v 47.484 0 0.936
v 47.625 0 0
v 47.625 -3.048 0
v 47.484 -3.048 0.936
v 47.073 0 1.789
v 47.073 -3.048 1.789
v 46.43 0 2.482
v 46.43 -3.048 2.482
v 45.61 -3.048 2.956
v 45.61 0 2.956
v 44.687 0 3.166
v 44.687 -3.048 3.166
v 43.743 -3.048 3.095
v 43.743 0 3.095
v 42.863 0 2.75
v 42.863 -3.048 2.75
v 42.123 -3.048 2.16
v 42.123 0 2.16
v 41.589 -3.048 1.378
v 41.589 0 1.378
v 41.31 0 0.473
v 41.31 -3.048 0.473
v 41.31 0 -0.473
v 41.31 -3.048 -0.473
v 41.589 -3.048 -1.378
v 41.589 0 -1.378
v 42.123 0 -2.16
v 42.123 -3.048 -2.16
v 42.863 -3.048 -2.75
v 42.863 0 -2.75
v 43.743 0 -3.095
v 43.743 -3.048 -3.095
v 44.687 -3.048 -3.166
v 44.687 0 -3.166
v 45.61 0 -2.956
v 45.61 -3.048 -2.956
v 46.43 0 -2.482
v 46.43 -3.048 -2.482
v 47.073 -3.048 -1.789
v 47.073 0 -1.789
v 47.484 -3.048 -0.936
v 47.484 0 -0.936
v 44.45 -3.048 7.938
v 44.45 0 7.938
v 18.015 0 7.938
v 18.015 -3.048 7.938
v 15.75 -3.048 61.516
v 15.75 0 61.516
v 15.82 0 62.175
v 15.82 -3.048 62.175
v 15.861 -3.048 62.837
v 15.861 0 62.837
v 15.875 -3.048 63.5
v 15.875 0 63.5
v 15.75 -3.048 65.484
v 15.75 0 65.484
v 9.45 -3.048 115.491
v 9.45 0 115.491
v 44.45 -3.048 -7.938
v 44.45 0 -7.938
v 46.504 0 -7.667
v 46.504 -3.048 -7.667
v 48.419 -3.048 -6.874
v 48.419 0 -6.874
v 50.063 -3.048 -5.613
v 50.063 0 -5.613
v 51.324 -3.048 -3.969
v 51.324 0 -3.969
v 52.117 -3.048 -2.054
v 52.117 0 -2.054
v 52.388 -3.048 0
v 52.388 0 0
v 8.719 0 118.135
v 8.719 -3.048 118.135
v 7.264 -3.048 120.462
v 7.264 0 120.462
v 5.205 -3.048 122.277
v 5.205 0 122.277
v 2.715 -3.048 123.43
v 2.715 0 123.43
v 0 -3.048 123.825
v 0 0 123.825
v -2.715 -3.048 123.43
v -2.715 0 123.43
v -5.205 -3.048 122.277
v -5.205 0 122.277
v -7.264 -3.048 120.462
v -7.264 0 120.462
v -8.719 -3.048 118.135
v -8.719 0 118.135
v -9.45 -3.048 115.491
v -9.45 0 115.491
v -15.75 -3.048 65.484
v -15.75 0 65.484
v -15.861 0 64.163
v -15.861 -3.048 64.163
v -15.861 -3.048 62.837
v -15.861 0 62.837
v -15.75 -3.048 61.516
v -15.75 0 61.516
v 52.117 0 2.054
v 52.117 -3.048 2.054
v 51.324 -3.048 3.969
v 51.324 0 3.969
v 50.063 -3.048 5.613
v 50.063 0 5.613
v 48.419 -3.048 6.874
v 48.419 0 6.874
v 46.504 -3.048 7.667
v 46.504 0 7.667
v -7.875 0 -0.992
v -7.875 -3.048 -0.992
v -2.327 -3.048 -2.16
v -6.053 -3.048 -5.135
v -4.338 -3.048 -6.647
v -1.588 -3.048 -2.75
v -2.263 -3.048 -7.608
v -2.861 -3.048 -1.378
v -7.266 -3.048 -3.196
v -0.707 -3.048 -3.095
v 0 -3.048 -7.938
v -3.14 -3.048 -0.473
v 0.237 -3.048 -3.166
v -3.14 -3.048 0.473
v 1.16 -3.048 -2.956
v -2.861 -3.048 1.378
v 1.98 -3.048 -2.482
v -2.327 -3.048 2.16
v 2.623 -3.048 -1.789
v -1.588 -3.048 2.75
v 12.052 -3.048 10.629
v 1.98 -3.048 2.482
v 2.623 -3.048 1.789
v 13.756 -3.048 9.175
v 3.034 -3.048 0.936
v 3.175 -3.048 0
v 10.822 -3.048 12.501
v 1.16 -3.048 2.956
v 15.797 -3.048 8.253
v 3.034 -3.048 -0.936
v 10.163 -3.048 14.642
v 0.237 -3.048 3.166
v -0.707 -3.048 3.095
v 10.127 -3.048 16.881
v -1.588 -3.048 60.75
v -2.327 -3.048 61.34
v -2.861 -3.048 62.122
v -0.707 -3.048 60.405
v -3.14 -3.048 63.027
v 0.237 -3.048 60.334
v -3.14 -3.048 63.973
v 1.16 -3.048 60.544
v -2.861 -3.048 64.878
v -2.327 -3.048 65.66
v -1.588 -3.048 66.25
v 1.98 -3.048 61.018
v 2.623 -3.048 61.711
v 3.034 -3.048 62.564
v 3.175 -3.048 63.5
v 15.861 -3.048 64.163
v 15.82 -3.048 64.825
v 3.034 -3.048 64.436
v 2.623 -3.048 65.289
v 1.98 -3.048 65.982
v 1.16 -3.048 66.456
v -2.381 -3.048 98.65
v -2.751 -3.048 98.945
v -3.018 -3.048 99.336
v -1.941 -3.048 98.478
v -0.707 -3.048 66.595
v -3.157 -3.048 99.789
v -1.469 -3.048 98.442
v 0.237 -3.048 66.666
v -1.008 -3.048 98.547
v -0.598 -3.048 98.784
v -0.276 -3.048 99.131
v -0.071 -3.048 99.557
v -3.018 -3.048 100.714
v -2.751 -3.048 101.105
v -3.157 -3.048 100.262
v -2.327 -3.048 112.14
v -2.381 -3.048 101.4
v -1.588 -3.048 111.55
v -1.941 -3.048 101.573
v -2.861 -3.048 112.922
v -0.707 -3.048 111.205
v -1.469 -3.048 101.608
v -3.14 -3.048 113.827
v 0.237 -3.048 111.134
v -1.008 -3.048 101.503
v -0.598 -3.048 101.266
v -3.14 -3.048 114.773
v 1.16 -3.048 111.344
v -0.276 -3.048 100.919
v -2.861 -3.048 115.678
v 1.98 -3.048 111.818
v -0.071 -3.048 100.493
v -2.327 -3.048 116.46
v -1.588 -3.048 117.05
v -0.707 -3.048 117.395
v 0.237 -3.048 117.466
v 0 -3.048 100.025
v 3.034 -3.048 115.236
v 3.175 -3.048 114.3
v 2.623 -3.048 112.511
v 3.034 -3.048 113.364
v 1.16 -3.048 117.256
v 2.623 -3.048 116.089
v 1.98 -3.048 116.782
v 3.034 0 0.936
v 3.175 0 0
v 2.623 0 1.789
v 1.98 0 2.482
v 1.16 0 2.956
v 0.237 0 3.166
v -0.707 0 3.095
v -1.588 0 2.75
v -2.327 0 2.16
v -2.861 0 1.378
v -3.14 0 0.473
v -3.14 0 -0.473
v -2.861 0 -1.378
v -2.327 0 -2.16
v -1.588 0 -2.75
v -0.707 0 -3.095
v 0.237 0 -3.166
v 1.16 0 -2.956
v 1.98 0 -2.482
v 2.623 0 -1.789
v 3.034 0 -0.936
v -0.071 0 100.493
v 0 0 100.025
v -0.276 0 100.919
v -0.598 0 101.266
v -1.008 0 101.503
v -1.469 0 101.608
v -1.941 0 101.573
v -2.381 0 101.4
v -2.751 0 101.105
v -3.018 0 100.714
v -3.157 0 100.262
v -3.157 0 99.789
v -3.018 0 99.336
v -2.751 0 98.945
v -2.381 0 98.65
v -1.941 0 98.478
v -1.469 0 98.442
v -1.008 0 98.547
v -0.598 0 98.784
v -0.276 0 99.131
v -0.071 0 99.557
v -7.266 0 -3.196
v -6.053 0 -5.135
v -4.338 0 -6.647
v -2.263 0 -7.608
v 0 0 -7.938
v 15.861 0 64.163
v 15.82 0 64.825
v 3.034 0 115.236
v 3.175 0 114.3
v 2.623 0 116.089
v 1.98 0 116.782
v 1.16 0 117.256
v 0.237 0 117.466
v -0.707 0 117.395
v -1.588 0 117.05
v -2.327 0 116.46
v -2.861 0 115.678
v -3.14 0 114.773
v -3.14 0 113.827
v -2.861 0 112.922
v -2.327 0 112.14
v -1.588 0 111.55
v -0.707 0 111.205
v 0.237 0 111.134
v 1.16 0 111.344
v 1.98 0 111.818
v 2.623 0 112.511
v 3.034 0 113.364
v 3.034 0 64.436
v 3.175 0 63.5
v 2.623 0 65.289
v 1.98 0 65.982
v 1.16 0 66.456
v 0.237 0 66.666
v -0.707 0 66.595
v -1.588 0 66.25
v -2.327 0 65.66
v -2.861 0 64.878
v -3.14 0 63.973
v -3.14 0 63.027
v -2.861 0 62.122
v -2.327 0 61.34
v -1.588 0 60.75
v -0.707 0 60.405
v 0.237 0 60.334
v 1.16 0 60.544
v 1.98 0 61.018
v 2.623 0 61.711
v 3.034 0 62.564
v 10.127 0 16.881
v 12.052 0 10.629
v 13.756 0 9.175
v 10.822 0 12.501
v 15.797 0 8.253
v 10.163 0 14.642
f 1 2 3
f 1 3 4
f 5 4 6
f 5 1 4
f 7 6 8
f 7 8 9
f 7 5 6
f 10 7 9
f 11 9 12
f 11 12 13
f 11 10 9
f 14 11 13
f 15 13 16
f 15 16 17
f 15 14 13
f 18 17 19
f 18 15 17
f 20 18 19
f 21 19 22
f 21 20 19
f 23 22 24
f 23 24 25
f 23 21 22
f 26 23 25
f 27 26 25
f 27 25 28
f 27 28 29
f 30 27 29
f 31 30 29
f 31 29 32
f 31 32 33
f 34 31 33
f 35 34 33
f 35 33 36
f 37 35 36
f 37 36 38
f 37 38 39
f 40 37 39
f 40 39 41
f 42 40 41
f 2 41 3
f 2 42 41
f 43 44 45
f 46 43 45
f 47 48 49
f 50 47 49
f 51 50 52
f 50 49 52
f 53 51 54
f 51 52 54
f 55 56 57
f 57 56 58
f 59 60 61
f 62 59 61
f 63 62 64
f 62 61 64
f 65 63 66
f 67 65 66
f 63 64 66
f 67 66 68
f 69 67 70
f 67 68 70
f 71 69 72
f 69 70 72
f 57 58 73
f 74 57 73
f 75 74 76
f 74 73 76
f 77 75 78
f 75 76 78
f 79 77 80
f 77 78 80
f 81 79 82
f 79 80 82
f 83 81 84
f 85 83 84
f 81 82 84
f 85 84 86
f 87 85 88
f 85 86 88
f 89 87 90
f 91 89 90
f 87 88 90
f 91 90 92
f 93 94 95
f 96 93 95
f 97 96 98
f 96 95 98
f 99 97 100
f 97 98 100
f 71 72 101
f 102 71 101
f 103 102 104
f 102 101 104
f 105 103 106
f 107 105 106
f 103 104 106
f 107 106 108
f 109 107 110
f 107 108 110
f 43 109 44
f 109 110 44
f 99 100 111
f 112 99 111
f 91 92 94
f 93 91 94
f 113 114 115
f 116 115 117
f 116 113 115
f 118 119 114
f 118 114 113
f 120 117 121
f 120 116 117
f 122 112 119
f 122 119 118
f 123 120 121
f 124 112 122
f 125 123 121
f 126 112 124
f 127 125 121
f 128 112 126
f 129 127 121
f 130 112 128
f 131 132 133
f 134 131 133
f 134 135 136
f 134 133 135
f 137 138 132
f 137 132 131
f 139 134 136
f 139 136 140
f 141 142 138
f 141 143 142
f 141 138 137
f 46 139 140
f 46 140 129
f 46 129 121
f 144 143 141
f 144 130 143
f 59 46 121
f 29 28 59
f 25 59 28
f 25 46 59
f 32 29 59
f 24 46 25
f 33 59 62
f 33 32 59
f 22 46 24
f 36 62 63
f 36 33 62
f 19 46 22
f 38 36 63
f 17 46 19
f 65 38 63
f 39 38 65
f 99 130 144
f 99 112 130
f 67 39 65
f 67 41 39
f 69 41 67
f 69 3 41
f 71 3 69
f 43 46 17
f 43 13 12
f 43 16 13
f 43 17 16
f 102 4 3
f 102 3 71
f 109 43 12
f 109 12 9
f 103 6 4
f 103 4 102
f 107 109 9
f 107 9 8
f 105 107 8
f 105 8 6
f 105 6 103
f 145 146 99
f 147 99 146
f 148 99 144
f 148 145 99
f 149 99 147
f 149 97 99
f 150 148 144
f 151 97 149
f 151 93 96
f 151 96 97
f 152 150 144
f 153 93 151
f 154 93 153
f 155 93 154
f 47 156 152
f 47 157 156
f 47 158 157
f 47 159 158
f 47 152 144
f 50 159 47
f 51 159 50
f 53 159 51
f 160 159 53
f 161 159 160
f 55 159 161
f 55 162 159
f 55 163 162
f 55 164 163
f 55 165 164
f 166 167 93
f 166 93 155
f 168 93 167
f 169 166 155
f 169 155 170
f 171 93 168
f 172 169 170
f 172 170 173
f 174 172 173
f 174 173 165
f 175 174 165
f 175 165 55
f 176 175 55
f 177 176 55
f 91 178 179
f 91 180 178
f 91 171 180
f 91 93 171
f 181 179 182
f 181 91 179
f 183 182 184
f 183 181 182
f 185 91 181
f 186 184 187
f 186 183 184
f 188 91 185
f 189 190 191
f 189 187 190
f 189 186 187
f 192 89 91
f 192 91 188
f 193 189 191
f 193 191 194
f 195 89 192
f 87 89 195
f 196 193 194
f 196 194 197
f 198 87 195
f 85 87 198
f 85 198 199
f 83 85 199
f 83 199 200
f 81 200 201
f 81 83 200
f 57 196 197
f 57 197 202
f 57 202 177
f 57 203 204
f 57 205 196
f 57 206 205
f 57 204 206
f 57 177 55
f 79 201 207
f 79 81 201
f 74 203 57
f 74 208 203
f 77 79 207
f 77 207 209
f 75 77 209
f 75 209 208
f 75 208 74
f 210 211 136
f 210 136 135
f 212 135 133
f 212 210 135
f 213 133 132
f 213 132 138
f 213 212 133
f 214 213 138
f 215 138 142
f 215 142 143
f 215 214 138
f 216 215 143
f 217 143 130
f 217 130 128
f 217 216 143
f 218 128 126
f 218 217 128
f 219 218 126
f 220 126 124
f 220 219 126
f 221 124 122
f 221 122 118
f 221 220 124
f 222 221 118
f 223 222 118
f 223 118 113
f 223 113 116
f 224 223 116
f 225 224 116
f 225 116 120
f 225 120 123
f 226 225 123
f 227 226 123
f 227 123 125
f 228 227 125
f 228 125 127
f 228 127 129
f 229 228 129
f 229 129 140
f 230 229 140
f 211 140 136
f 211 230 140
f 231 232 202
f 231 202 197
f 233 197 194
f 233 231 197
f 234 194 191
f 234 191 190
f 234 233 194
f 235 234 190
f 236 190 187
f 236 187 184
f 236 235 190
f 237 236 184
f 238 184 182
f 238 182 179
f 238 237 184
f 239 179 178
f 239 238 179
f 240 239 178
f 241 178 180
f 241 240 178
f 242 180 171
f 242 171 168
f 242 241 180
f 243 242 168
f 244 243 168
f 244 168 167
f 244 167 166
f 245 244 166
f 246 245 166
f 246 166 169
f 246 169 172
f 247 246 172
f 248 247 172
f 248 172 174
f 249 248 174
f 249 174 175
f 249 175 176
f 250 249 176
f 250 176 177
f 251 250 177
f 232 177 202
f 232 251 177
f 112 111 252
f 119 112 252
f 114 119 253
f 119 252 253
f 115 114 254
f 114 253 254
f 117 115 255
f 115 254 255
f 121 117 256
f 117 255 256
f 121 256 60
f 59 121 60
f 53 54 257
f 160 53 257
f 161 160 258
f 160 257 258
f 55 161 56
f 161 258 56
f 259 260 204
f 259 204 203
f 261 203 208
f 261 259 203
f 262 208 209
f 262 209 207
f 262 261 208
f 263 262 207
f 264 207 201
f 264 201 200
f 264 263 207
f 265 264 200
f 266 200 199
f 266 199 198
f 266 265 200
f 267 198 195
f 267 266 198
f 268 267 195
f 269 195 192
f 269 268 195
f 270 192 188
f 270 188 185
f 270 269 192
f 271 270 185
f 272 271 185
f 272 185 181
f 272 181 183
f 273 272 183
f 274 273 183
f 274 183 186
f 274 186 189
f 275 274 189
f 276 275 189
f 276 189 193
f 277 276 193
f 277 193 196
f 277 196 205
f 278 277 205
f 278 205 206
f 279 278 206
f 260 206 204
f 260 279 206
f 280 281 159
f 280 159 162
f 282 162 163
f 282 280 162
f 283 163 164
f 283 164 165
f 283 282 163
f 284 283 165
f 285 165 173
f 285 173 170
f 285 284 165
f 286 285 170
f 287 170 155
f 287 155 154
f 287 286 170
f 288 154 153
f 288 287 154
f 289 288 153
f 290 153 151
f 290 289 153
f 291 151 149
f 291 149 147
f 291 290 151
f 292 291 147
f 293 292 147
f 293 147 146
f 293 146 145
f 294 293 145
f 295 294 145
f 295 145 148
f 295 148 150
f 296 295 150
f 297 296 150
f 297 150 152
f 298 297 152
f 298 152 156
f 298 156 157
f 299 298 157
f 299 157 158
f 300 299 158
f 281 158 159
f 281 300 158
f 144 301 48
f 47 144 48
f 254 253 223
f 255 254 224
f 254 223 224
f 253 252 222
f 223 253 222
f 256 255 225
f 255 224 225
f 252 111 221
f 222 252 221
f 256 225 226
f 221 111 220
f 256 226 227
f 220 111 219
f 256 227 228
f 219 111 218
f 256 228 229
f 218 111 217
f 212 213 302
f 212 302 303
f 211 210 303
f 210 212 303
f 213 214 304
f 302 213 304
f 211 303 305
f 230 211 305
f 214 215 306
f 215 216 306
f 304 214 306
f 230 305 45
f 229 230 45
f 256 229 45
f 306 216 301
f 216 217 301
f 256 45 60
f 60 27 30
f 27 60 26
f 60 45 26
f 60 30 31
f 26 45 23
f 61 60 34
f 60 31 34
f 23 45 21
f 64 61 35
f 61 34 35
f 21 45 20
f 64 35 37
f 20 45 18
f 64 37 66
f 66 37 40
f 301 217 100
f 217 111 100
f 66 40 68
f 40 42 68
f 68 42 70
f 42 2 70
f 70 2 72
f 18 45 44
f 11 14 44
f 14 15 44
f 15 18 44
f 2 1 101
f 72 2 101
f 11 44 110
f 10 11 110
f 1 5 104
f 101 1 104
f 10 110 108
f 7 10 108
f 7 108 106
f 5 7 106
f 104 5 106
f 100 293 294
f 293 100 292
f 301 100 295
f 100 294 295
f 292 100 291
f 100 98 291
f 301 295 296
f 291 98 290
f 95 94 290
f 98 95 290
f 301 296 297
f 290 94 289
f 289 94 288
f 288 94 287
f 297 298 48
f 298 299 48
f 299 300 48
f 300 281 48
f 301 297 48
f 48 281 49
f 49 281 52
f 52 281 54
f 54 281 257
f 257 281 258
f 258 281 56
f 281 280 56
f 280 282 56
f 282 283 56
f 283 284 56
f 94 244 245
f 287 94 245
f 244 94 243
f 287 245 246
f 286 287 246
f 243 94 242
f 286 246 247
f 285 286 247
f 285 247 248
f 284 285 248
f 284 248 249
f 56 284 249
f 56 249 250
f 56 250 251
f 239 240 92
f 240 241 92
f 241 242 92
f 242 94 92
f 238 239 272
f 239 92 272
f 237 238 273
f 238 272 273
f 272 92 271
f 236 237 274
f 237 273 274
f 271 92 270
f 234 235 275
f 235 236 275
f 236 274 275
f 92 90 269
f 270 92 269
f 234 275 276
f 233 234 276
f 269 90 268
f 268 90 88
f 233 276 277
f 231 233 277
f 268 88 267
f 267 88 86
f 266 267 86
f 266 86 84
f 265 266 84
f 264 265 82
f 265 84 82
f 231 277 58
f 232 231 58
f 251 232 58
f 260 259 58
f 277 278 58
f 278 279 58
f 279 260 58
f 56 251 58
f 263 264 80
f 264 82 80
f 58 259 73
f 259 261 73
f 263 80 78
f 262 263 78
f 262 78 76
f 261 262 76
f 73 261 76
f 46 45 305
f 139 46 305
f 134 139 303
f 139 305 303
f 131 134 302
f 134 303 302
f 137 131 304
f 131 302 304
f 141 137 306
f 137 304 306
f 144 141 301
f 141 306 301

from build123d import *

# Parameters (mm, degrees)
F0_R     = 3.175
F0_R_2   = 1.5875
F1_DEPTH = 3.048


with BuildPart() as f1:
    # F0 (on Front) → F1 (new body)
    with BuildSketch(Plane.XZ):
        with BuildLine():
            ThreePointArc((-9.450293, 115.490625), (-0.596483, 104.793695), (9.525, 114.3))
            ThreePointArc((9.525, 114.3), (9.506305, 114.896483), (9.450293, 115.490625))
            ThreePointArc((9.450293, 115.490625), (0, 123.825), (-9.450293, 115.490625))
        make_face()
        with Locations((0, 114.3)):
            Circle(F0_R, mode=Mode.SUBTRACT)
        with BuildLine():
            ThreePointArc((9.450293, 115.490625), (9.506305, 114.896483), (9.525, 114.3))
            ThreePointArc((9.525, 114.3), (-0.596483, 104.793695), (-9.450293, 115.490625))
            Line((-9.450293, 115.490625), (-15.750488, 65.484375))
            ThreePointArc((-15.750488, 65.484375), (0, 79.375), (15.750488, 65.484375))
            Line((15.750488, 65.484375), (9.450293, 115.490625))
        make_face()
        with Locations((-1.5875, 100.0252)):
            Circle(F0_R_2, mode=Mode.SUBTRACT)
        with BuildLine():
            ThreePointArc((15.875, 63.5), (15.843841, 64.494139), (15.750488, 65.484375))
            ThreePointArc((15.750488, 65.484375), (0, 79.375), (-15.750488, 65.484375))
            ThreePointArc((-15.750488, 65.484375), (-15.875, 63.5), (-15.750488, 61.515625))
            ThreePointArc((-15.750488, 61.515625), (0, 47.625), (15.750488, 61.515625))
            ThreePointArc((15.750488, 61.515625), (15.843841, 62.505861), (15.875, 63.5))
        make_face()
        with Locations((0, 63.5)):
            Circle(F0_R, mode=Mode.SUBTRACT)
        with BuildLine():
            ThreePointArc((15.750488, 61.515625), (0, 47.625), (-15.750488, 61.515625))
            Line((-15.750488, 61.515625), (-7.875244, -0.992188))
            ThreePointArc((-7.875244, -0.992188), (-0.497069, 7.921921), (7.9375, 0))
            ThreePointArc((7.9375, 0), (5.61266, -5.61266), (0, -7.9375))
            Line((0, -7.9375), (44.45, -7.9375))
            ThreePointArc((44.45, -7.9375), (36.5125, 0), (44.45, 7.9375))
            Line((44.45, 7.9375), (18.014958, 7.9375))
            ThreePointArc((18.014958, 7.9375), (12.052308, 10.629137), (10.127114, 16.881475))
            Line((10.127114, 16.881475), (15.750488, 61.515625))
        make_face()
        with BuildLine():
            ThreePointArc((7.9375, 0), (-0.497069, 7.921921), (-7.875244, -0.992188))
            ThreePointArc((-7.875244, -0.992188), (-5.250163, -5.953125), (0, -7.9375))
            ThreePointArc((0, -7.9375), (5.61266, -5.61266), (7.9375, 0))
        make_face()
        Circle(F0_R, mode=Mode.SUBTRACT)
        with BuildLine():
            ThreePointArc((44.45, 7.9375), (36.5125, 0), (44.45, -7.9375))
            ThreePointArc((44.45, -7.9375), (50.06266, -5.61266), (52.3875, 0))
            ThreePointArc((52.3875, 0), (50.06266, 5.61266), (44.45, 7.9375))
        make_face()
        with Locations((44.45, 0)):
            Circle(F0_R, mode=Mode.SUBTRACT)
    extrude(amount=F1_DEPTH)


solid = f1.part
